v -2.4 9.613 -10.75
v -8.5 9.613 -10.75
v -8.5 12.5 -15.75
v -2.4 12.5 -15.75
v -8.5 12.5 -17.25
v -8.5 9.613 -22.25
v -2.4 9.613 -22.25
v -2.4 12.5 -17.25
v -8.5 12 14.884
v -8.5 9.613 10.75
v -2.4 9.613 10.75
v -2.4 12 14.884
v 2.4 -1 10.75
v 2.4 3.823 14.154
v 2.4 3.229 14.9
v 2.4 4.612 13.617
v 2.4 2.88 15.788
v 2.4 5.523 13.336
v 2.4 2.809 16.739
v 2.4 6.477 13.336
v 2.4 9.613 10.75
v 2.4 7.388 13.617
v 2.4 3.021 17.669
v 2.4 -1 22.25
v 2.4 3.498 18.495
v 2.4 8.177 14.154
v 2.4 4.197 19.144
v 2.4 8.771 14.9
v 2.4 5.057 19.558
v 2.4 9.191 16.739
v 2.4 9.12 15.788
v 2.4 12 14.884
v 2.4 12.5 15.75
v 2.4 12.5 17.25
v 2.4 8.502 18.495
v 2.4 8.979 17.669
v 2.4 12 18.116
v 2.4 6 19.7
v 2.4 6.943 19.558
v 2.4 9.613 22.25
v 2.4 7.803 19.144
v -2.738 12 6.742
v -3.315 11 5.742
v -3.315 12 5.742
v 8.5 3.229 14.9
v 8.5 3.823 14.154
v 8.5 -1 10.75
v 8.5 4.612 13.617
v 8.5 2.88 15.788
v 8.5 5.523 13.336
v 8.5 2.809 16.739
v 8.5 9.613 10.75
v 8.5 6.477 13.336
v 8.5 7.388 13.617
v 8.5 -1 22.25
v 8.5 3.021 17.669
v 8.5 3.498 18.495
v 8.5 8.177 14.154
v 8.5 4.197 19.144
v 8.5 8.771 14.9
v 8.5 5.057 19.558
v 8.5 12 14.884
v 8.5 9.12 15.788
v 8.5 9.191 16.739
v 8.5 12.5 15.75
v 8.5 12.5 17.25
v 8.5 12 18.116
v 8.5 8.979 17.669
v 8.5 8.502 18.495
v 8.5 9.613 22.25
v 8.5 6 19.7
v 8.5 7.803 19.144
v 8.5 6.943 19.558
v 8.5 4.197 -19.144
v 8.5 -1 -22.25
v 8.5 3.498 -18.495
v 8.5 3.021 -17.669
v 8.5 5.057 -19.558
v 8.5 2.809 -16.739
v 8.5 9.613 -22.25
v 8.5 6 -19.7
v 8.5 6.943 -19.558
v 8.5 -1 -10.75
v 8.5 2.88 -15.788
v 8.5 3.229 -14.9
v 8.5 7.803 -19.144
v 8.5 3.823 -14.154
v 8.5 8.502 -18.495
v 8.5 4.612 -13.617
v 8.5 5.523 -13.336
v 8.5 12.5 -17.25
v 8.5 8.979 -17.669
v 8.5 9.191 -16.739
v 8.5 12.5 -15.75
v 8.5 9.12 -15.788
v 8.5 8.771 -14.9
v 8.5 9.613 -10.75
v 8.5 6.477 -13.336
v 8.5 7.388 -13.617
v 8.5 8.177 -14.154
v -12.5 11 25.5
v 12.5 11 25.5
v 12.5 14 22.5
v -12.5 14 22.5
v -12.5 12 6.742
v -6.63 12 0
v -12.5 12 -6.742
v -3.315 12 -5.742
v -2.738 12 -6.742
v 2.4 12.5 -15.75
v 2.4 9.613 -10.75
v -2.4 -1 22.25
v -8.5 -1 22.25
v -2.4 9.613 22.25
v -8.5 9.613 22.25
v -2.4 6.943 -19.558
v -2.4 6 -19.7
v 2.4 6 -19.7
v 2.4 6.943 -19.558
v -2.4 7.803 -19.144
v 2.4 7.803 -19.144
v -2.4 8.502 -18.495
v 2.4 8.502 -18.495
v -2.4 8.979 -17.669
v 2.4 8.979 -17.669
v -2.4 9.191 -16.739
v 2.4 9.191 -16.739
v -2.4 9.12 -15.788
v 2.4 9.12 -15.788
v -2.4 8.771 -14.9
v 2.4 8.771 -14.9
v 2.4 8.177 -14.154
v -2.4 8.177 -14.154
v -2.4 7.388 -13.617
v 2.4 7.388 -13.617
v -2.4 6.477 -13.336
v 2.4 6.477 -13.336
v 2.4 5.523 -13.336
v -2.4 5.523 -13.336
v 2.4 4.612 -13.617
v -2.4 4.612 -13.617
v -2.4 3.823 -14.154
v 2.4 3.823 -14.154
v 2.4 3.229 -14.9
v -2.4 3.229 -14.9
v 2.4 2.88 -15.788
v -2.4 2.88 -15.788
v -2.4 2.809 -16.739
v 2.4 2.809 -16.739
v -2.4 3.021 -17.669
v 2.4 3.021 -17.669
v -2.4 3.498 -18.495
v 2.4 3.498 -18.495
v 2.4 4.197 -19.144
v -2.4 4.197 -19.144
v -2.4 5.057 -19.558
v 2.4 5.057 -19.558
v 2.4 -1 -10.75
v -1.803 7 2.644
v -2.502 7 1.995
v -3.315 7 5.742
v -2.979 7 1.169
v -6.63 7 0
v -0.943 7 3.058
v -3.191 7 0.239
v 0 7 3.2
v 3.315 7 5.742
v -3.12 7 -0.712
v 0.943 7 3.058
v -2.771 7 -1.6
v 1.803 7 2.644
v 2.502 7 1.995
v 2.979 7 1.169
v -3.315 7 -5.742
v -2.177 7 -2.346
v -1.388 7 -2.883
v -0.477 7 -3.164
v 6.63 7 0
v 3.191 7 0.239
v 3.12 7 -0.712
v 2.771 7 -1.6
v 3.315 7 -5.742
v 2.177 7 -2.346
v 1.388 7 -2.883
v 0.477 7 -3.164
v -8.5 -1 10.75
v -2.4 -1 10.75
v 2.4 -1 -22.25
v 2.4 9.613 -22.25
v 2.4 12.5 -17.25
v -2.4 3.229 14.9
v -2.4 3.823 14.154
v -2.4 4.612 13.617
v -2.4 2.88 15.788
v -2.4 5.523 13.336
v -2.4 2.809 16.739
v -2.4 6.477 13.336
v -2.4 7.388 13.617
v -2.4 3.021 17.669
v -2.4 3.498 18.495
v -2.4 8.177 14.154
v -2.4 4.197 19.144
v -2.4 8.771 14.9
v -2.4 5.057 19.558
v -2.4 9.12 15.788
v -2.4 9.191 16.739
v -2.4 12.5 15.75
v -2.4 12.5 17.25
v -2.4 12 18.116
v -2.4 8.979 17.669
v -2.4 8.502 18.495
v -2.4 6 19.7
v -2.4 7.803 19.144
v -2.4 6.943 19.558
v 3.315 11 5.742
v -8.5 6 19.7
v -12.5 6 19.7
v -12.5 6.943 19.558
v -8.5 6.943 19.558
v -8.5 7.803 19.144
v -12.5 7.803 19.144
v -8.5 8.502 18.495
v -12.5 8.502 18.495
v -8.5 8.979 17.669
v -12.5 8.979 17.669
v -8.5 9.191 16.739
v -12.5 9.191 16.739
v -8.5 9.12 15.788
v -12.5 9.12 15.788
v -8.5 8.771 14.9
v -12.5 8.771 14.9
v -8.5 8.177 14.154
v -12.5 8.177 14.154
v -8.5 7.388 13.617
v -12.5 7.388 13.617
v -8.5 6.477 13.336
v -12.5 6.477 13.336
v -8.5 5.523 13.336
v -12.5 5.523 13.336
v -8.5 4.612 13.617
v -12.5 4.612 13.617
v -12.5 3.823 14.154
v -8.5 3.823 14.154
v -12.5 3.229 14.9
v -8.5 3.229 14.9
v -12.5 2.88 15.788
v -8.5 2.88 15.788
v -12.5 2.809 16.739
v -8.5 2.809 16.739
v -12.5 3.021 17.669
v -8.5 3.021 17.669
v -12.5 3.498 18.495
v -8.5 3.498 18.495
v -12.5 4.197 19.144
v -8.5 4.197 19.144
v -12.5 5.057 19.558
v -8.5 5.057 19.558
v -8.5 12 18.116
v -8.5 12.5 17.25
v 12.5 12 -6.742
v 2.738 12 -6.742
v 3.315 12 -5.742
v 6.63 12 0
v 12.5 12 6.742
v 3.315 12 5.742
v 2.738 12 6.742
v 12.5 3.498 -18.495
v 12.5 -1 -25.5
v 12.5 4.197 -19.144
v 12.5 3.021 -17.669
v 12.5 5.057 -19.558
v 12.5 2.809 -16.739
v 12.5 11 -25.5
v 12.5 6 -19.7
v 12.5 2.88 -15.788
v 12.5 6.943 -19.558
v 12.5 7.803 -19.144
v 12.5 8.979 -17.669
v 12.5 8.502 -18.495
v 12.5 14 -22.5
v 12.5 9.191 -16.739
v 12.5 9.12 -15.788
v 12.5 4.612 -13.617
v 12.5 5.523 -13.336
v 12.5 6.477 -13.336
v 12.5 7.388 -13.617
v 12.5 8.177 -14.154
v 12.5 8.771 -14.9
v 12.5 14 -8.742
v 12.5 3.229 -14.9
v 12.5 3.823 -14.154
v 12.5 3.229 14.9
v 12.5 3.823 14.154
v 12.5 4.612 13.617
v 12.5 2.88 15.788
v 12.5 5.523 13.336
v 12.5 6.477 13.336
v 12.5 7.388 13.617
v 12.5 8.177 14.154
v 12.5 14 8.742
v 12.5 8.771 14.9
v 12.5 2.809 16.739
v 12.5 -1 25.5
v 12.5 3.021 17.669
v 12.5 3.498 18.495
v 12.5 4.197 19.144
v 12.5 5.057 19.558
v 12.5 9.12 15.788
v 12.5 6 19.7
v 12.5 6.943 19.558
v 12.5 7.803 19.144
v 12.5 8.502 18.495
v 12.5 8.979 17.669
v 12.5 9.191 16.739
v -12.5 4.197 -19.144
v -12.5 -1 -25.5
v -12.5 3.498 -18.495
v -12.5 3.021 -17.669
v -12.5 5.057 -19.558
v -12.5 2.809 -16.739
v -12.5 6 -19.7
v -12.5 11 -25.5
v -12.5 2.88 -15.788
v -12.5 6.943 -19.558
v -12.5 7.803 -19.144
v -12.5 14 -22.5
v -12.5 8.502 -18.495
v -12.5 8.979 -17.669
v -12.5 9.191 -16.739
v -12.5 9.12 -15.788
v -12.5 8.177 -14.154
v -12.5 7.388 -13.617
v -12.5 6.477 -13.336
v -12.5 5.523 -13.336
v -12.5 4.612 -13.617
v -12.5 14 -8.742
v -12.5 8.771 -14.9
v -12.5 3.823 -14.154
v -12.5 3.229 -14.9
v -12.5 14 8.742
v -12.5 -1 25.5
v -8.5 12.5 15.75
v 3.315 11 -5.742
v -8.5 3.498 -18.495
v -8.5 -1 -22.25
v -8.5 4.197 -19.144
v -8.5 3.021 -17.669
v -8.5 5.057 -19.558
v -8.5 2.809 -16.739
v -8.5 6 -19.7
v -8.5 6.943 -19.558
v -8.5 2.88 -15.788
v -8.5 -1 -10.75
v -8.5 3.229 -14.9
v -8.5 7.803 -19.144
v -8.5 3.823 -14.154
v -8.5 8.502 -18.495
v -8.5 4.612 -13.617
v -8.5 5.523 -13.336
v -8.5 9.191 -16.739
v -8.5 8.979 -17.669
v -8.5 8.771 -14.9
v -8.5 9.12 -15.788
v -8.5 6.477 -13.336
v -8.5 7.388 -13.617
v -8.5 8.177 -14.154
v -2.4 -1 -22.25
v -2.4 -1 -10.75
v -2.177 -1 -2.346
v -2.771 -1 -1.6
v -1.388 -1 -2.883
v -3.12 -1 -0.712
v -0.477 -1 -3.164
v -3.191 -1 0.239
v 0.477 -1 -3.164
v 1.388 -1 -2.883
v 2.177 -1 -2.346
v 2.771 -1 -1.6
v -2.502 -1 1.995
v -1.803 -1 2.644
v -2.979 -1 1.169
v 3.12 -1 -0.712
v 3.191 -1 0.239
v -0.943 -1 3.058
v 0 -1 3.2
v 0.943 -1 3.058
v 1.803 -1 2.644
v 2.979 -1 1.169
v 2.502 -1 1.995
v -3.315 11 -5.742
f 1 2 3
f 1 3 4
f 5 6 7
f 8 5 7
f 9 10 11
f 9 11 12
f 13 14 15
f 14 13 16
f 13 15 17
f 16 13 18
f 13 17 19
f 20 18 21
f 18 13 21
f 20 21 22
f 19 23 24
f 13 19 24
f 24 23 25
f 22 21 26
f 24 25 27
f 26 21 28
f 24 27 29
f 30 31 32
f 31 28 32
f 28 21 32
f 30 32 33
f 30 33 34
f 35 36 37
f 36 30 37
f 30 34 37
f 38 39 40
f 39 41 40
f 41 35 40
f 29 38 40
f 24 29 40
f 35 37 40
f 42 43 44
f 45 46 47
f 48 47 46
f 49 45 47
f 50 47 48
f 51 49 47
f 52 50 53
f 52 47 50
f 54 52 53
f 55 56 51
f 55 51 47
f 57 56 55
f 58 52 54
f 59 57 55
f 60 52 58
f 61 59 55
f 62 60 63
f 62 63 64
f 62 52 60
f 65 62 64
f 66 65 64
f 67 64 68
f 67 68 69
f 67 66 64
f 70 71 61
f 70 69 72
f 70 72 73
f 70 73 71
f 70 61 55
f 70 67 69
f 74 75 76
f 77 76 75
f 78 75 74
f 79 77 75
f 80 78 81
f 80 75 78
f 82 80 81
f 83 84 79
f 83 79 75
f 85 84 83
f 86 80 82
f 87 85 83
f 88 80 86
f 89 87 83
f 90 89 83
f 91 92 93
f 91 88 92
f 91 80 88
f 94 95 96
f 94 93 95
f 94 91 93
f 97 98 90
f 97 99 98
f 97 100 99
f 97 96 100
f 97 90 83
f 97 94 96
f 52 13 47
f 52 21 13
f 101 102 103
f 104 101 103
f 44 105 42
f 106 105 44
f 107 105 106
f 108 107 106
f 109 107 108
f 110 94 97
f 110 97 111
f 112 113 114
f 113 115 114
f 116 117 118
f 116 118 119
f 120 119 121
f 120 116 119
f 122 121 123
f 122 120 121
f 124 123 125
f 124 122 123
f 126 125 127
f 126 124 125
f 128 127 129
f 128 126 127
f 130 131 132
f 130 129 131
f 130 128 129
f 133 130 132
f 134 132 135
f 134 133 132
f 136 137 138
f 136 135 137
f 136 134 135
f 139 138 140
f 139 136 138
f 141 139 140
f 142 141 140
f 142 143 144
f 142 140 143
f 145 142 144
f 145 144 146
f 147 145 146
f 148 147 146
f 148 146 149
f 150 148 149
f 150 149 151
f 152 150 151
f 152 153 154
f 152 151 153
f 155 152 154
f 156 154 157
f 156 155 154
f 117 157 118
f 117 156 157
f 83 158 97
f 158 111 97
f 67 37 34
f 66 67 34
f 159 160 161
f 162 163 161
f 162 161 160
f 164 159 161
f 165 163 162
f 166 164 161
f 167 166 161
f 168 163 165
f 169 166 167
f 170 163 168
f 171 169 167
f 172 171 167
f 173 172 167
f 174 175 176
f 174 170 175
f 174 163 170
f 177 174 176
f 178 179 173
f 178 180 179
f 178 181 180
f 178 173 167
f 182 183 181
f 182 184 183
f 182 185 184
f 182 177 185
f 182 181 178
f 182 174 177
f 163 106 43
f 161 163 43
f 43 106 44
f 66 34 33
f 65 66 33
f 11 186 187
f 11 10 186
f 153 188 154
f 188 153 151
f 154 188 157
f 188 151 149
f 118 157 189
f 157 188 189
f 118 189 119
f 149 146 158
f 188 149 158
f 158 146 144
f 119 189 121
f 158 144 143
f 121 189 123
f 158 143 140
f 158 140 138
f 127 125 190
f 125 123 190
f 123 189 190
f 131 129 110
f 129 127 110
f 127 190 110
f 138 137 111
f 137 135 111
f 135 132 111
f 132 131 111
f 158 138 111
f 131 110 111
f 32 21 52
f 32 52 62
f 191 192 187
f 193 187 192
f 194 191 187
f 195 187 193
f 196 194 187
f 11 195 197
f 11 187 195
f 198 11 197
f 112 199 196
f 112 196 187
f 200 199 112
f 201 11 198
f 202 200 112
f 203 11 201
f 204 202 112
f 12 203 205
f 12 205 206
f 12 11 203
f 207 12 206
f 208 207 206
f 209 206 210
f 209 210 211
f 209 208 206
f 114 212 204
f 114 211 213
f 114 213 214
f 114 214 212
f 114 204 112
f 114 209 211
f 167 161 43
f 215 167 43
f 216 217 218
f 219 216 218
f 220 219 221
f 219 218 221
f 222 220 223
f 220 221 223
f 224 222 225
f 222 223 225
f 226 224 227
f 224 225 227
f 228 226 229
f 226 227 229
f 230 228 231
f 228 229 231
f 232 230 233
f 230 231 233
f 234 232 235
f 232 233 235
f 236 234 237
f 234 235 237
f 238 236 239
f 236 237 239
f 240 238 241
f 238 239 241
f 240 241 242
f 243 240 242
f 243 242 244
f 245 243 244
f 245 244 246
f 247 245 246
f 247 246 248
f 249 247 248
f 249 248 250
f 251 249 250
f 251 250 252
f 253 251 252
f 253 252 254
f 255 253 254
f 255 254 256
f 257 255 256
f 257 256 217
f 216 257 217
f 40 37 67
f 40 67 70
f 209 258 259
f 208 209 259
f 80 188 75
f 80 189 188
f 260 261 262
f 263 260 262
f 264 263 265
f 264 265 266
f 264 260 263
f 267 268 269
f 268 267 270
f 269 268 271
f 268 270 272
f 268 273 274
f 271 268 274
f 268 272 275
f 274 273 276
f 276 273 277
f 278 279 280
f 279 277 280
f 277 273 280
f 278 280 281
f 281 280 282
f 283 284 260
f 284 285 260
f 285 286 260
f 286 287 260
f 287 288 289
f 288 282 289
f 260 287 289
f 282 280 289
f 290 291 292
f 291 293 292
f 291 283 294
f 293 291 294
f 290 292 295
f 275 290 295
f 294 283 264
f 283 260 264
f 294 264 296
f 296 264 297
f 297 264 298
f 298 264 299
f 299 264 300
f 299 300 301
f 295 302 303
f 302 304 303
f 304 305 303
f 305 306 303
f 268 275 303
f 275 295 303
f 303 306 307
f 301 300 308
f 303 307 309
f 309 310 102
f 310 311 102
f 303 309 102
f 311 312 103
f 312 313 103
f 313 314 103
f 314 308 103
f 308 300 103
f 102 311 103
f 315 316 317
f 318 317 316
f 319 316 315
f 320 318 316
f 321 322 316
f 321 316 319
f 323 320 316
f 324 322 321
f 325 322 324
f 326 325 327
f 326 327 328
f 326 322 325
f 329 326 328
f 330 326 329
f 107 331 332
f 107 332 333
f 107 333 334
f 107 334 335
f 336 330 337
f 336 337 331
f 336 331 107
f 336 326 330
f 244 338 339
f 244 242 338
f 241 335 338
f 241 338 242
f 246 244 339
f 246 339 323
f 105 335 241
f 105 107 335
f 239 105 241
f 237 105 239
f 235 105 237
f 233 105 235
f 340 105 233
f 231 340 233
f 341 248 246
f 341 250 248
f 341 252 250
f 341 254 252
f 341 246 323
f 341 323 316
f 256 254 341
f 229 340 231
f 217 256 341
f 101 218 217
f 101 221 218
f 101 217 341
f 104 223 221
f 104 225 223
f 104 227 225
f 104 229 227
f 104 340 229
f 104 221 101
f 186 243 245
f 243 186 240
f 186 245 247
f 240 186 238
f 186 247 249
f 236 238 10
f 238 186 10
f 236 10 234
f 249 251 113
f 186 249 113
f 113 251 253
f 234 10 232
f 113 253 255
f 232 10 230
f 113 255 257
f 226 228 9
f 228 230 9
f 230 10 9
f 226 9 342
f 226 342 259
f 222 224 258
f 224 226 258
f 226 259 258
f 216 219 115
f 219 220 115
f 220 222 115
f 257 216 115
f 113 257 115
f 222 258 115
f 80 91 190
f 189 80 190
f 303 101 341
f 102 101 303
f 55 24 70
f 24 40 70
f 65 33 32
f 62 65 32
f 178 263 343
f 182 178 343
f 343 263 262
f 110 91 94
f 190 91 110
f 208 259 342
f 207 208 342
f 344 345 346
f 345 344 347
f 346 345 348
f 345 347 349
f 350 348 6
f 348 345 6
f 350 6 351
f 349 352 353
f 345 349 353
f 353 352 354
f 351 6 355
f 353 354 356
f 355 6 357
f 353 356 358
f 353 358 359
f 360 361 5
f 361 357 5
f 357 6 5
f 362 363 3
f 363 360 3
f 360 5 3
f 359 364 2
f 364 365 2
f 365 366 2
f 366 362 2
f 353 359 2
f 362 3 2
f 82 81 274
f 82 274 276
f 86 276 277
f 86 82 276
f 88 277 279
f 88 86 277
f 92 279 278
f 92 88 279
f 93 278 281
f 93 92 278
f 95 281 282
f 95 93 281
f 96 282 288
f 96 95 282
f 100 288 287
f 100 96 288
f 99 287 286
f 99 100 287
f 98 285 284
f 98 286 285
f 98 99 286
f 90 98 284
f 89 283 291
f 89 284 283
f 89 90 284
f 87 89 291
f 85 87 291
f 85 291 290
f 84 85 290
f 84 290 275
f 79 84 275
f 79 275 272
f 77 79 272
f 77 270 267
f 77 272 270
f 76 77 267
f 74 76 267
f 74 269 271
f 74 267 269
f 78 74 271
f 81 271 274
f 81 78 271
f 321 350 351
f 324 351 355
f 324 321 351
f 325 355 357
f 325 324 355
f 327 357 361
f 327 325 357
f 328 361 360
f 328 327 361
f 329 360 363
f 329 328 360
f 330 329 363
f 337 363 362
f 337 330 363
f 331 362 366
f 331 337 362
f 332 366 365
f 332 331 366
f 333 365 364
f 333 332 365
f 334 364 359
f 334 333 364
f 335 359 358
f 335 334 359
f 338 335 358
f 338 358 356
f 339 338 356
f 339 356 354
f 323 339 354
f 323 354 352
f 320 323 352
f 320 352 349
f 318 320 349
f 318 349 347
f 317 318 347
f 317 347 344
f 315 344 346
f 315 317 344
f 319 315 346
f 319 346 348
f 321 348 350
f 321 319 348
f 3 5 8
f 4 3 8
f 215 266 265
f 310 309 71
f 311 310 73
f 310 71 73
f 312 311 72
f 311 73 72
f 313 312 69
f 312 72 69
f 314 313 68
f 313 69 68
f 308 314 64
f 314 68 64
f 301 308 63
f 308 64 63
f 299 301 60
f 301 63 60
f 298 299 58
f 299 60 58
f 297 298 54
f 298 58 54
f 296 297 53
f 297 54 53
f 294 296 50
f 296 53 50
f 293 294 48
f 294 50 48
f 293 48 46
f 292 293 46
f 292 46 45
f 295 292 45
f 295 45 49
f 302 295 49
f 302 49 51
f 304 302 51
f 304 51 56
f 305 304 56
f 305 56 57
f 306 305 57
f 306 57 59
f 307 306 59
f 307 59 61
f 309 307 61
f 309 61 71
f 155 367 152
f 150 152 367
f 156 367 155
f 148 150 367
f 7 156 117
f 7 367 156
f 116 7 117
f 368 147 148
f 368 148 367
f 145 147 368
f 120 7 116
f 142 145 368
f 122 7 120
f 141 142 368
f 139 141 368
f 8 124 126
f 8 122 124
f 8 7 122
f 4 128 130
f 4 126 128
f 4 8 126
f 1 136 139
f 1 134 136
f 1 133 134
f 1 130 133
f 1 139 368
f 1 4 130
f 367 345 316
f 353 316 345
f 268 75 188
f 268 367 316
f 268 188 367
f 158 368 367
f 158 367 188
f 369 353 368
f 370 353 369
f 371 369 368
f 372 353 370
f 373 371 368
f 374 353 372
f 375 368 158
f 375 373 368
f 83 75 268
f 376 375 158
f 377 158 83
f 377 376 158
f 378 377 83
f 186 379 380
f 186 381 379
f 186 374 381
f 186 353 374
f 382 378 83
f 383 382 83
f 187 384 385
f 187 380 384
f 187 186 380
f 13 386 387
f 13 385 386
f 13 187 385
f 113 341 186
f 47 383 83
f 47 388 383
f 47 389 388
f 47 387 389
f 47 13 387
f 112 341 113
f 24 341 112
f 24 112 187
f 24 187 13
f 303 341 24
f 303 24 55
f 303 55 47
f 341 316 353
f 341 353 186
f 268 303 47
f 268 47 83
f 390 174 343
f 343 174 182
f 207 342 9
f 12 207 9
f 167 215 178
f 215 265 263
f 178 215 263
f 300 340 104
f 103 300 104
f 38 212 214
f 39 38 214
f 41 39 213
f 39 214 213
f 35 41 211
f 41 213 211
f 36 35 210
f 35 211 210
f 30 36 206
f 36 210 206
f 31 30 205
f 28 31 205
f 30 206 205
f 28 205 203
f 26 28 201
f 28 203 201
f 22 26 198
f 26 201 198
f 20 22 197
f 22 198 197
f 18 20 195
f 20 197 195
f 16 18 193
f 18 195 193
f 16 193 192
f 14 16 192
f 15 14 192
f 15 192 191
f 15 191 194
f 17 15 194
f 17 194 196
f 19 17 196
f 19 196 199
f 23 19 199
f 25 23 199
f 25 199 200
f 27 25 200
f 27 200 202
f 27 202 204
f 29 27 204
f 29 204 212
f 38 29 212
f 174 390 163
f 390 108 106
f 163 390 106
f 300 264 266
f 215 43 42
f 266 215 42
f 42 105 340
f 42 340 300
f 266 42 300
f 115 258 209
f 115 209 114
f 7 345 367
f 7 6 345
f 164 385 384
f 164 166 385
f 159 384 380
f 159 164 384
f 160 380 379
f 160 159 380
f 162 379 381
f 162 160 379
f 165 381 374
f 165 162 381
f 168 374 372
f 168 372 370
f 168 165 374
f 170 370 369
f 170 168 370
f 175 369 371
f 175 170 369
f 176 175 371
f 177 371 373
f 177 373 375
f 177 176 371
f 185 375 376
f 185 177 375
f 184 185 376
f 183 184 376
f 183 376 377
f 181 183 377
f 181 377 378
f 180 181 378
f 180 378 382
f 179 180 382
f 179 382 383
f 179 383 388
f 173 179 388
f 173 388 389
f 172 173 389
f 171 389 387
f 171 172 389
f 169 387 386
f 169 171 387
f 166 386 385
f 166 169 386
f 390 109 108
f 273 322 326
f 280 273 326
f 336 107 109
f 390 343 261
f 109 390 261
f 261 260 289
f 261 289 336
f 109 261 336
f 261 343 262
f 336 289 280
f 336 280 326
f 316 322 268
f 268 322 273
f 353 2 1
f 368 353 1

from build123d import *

# Parameters (mm, degrees)
SKETCH1_W                    = 25
SKETCH1_H                    = 45
BOSS_EXTRUDE1_DEPTH          = 12
CUT_EXTRUDE1_DEPTH           = 5
SKETCH3_R                    = 3.2
CUT_EXTRUDE2_DEPTH           = 27.673957337
SKETCH8_R                    = 3.2
CUT_EXTRUDE5_DEPTH           = 36.710642671
SKETCH9_W                    = 25
SKETCH9_H                    = 16.758251573
BOSS_EXTRUDE2_DEPTH          = 2
SKETCH12_W                   = 6.1
SKETCH12_H                   = 11.5
CUT_EXTRUDE6_DEPTH           = 12.5
CHAMFER1_SIZE                = 5
CHAMFER1_SIZE2               = 2.886751346
SKETCH14_W                   = 25
SKETCH14_H                   = 14
BOSS_EXTRUDE3_DEPTH          = 3
CHAMFER1_OF_MIRROR2_SIZE2    = 5
CHAMFER1_OF_MIRROR2_SIZE     = 2.886751346
MIRROR3_START                = -8.5
MIRROR3_OUTLINE_R            = 3.2
MIRROR3_DEPTH                = 6.1
MIRROR3_START_2              = 2.4
MIRROR3_2_OUTLINE_R          = 3.2
MIRROR3_2_DEPTH              = 6.1
MIRROR3_START_3              = -12.5
MIRROR3_3_DEPTH              = 25
MIRROR3_START_4              = -2.4
MIRROR3_4_DEPTH              = 4.8
MIRROR3_5_DEPTH              = 4
MIRROR3_START_5              = 8.5
MIRROR3_6_DEPTH              = 4
CHAMFER2_SIZE                = 3
SKETCH17_W                   = 25
SKETCH17_H                   = 51
SKETCH17_R                   = 3.2
SKETCH17_W_2                 = 6.1
SKETCH17_H_2                 = 11.5
EXTRA_1MM_BASE_EXTRUDE_DEPTH = 1


# Read off the part's stored shape, not the designer's step: Mirror3
with BuildPart() as part:
    # Sketch1 → Boss-Extrude1 (new body)
    with BuildSketch(Plane(origin=(0, 0, 0), x_dir=(1, 0, 0), z_dir=(0, 1, 0))):
        Rectangle(SKETCH1_W, SKETCH1_H)
    extrude(amount=BOSS_EXTRUDE1_DEPTH)

    # Sketch2 → Cut-Extrude1 (cut)
    with BuildSketch(Plane(origin=(0, 12, 0), x_dir=(1, 0, 0), z_dir=(0, 1, 0))):
        Polygon((3.315, -5.741748427), (6.63, 0), (3.315, 5.741748427), (-3.315, 5.741748427), (-6.63, 0), (-3.315, -5.741748427), align=None)
    extrude(amount=-CUT_EXTRUDE1_DEPTH, mode=Mode.SUBTRACT)

    # Sketch3 → Cut-Extrude2 (cut, through all)
    with BuildSketch(Plane(origin=(0, 7, 0), x_dir=(1, 0, 0), z_dir=(0, 1, 0))):
        with Locations(Location((0, 0, 0), (0, 0, 270))):
            Circle(SKETCH3_R)
    extrude(amount=-CUT_EXTRUDE2_DEPTH, mode=Mode.SUBTRACT)

    # Sketch8 → Cut-Extrude5 (cut, through all)
    with BuildSketch(Plane.ZY.offset(12.5)):
        with Locations((16.5, 6)):
            Circle(SKETCH8_R)
    cut_extrude5 = extrude(amount=-CUT_EXTRUDE5_DEPTH, mode=Mode.SUBTRACT)

    # Mirror1: Cut-Extrude5 across plane
    add(cut_extrude5.mirror(Plane.XY), mode=Mode.SUBTRACT)

    # Sketch9 → Boss-Extrude2 (add)
    with BuildSketch(Plane(origin=(0, 12, 0), x_dir=(1, 0, 0), z_dir=(0, 1, 0))):
        with Locations((0, 14.120874214)):
            Rectangle(SKETCH9_W, SKETCH9_H)
    extrude(amount=BOSS_EXTRUDE2_DEPTH)

    # Sketch12 → Cut-Extrude6 (cut)
    with BuildSketch(Plane(origin=(0, 0, 0), x_dir=(1, 0, 0), z_dir=(0, 1, 0))):
        with Locations((-5.45, 16.5)):
            Rectangle(SKETCH12_W, SKETCH12_H)
    cut_extrude6 = extrude(amount=CUT_EXTRUDE6_DEPTH, mode=Mode.SUBTRACT)

    # Chamfer1
    chamfer1_edges = [part.edges().sort_by_distance(p)[0] for p in [
        (-5.45, 12.5, -10.75),
        (-5.45, 12.5, -22.25),
    ]]
    chamfer1_side = [part.faces().sort_by_distance(p)[0] for p in [
        (-5.45, 12.5, -16.5),
    ]]
    chamfer(chamfer1_edges, length=CHAMFER1_SIZE, length2=CHAMFER1_SIZE2, reference=chamfer1_side[0])

    # Sketch14 → Boss-Extrude3 (add)
    with BuildSketch(Plane(origin=(0, 0, -22.5), x_dir=(-1, 0, 0), z_dir=(0, 0, -1))):
        with Locations((0, 7)):
            Rectangle(SKETCH14_W, SKETCH14_H)
    extrude(amount=BOSS_EXTRUDE3_DEPTH)

    # Mirror2: Cut-Extrude6 across plane
    add(cut_extrude6.mirror(Plane(origin=(0, 0, 0), x_dir=(0, 0, 1), z_dir=(1, 0, 0))), mode=Mode.SUBTRACT)

    # Chamfer1 of Mirror2
    chamfer1_of_mirror2_edges = [part.edges().sort_by_distance(p)[0] for p in [
        (5.45, 12.5, -10.75),
        (5.45, 12.5, -22.25),
    ]]
    chamfer(chamfer1_of_mirror2_edges, length=CHAMFER1_OF_MIRROR2_SIZE, length2=CHAMFER1_OF_MIRROR2_SIZE2)

    # Mirror3 outline → Mirror3 (cut)
    with BuildSketch(Plane.YZ.offset(MIRROR3_START)):
        Polygon((9.613248654, 10.75), (12, 14.883974596), (12, 18.116025404), (9.613248654, 22.25), (0, 22.25), (0, 10.75), align=None)
        with Locations((6, 16.5)):
            Circle(MIRROR3_OUTLINE_R, mode=Mode.SUBTRACT)
    extrude(amount=MIRROR3_DEPTH, mode=Mode.SUBTRACT)

    # Mirror3 2 outline → Mirror3 2 (cut)
    with BuildSketch(Plane.YZ.offset(MIRROR3_START_2)):
        Polygon((9.613248654, 10.75), (12, 14.883974596), (12, 18.116025404), (9.613248654, 22.25), (0, 22.25), (0, 10.75), align=None)
        with Locations((6, 16.5)):
            Circle(MIRROR3_2_OUTLINE_R, mode=Mode.SUBTRACT)
    extrude(amount=MIRROR3_2_DEPTH, mode=Mode.SUBTRACT)

    # Mirror3 3 outline → Mirror3 3 (add)
    with BuildSketch(Plane.YZ.offset(MIRROR3_START_3)):
        Polygon((12, 5.741748427), (14, 5.741748427), (14, 25.5), (0, 25.5), (0, 22.5), (12, 22.5), (12, 18.116025404), (12.5, 17.25), (12.5, 15.75), (12, 14.883974596), align=None)
    extrude(amount=MIRROR3_3_DEPTH)

    # Mirror3 4 outline → Mirror3 4 (add)
    with BuildSketch(Plane.YZ.offset(MIRROR3_START_4)):
        Polygon((12, 18.116025404), (12, 14.883974596), (12.5, 15.75), (12.5, 17.25), align=None)
    extrude(amount=MIRROR3_4_DEPTH)

    # Mirror3 5 outline → Mirror3 5 (add)
    with BuildSketch(Plane.YZ.offset(MIRROR3_START_3)):
        Polygon((12, 18.116025404), (12, 14.883974596), (12.5, 15.75), (12.5, 17.25), align=None)
    extrude(amount=MIRROR3_5_DEPTH)

    # Mirror3 6 outline → Mirror3 6 (add)
    with BuildSketch(Plane.YZ.offset(MIRROR3_START_5)):
        Polygon((12, 18.116025404), (12, 14.883974596), (12.5, 15.75), (12.5, 17.25), align=None)
    extrude(amount=MIRROR3_6_DEPTH)

    # Chamfer2
    # the kernel refuses this chamfer: 3 mm, written as the material it takes off along each edge
    with BuildSketch(Plane(origin=(20.215048964, 14, -5.741748427), x_dir=(0, -0.9996219169112969, 0.027495876610586497), z_dir=(-1, 0, 0))) as chamfer2_piece_1_section:
        Polygon((CHAMFER2_SIZE * 0.999621916911, -CHAMFER2_SIZE * 0.0274958766106), (-CHAMFER2_SIZE * 0.0274958766106, -CHAMFER2_SIZE * 0.999621916911), (0, 0), align=None)
    chamfer2_piece_1 = extrude(amount=40.430097928, mode=Mode.PRIVATE)
    chamfer2_piece_1 = split(chamfer2_piece_1, bisect_by=Plane(origin=(11.444466888, 12, -6.852192504), z_dir=(0, 1, 0)), keep=Keep.TOP, mode=Mode.PRIVATE)
    chamfer2_piece_1 = split(chamfer2_piece_1, bisect_by=Plane(origin=(4.866530332, 13.212813285, -3.054419063), z_dir=(0.8660254037844385, 0, -0.5000000000000003)), keep=Keep.TOP, mode=Mode.PRIVATE)
    add(chamfer2_piece_1, mode=Mode.SUBTRACT)
    with BuildSketch(Plane(origin=(20.215048964, 14, -5.741748427), x_dir=(0, -0.9996219169112969, 0.027495876610586497), z_dir=(-1, 0, 0))) as chamfer2_piece_2_section:
        Polygon((CHAMFER2_SIZE * 0.999621916911, -CHAMFER2_SIZE * 0.0274958766106), (-CHAMFER2_SIZE * 0.0274958766106, -CHAMFER2_SIZE * 0.999621916911), (0, 0), align=None)
    chamfer2_piece_2 = extrude(amount=40.430097928, mode=Mode.PRIVATE)
    chamfer2_piece_2 = split(chamfer2_piece_2, bisect_by=Plane(origin=(0, 12, -5.991035204), z_dir=(0, -1, 0)), keep=Keep.TOP, mode=Mode.PRIVATE)
    chamfer2_piece_2 = split(chamfer2_piece_2, bisect_by=Plane(origin=(-2.378305659, 11.613346541, -7.364150617), z_dir=(0.8660254037844387, 0, 0.5000000000000001)), keep=Keep.TOP, mode=Mode.PRIVATE)
    chamfer2_piece_2 = split(chamfer2_piece_2, bisect_by=Plane(origin=(2.378305659, 11.613346541, -7.364150617), z_dir=(-0.8660254037844385, 0, 0.5000000000000003)), keep=Keep.TOP, mode=Mode.PRIVATE)
    add(chamfer2_piece_2, mode=Mode.SUBTRACT)
    with BuildSketch(Plane(origin=(20.215048964, 14, -5.741748427), x_dir=(0, -0.9996219169112969, 0.027495876610586497), z_dir=(-1, 0, 0))) as chamfer2_piece_3_section:
        Polygon((CHAMFER2_SIZE * 0.999621916911, -CHAMFER2_SIZE * 0.0274958766106), (-CHAMFER2_SIZE * 0.0274958766106, -CHAMFER2_SIZE * 0.999621916911), (0, 0), align=None)
    chamfer2_piece_3 = extrude(amount=40.430097928, mode=Mode.PRIVATE)
    chamfer2_piece_3 = split(chamfer2_piece_3, bisect_by=Plane(origin=(0, 12, -6.713987666), z_dir=(0, 1, 0)), keep=Keep.TOP, mode=Mode.PRIVATE)
    chamfer2_piece_3 = split(chamfer2_piece_3, bisect_by=Plane(origin=(-2.06525806, 13.168089522, -7.906364963), z_dir=(0.8660254037844387, 0, 0.5000000000000001)), keep=Keep.TOP, mode=Mode.PRIVATE)
    chamfer2_piece_3 = split(chamfer2_piece_3, bisect_by=Plane(origin=(2.06525806, 13.168089522, -7.906364963), z_dir=(-0.8660254037844385, 0, 0.5000000000000003)), keep=Keep.TOP, mode=Mode.PRIVATE)
    add(chamfer2_piece_3, mode=Mode.SUBTRACT)
    with BuildSketch(Plane(origin=(20.215048964, 14, -5.741748427), x_dir=(0, -0.9996219169112969, 0.027495876610586497), z_dir=(-1, 0, 0))) as chamfer2_piece_4_section:
        Polygon((CHAMFER2_SIZE * 0.999621916911, -CHAMFER2_SIZE * 0.0274958766106), (-CHAMFER2_SIZE * 0.0274958766106, -CHAMFER2_SIZE * 0.999621916911), (0, 0), align=None)
    chamfer2_piece_4 = extrude(amount=40.430097928, mode=Mode.PRIVATE)
    chamfer2_piece_4 = split(chamfer2_piece_4, bisect_by=Plane(origin=(-11.444466888, 12, -6.852192504), z_dir=(0, 1, 0)), keep=Keep.TOP, mode=Mode.PRIVATE)
    chamfer2_piece_4 = split(chamfer2_piece_4, bisect_by=Plane(origin=(-4.866530332, 13.212813285, -3.054419063), z_dir=(-0.8660254037844387, 0, -0.5000000000000001)), keep=Keep.TOP, mode=Mode.PRIVATE)
    add(chamfer2_piece_4, mode=Mode.SUBTRACT)
    with BuildSketch(Plane(origin=(-20.215048964, 14, 25.5), x_dir=(0, -0.9996219169112968, 0.02749587661058678), z_dir=(1, 0, 0)), Plane(origin=(20.215048964, 14, -25.5), x_dir=(0, -0.9996219169112968, -0.02749587661058678), z_dir=(-1, 0, 0))) as chamfer2_piece_5:
        Polygon((CHAMFER2_SIZE * 0.999621916911, CHAMFER2_SIZE * 0.0274958766106), (-CHAMFER2_SIZE * 0.0274958766106, CHAMFER2_SIZE * 0.999621916911), (0, 0), align=None)
    extrude(amount=40.430097928, mode=Mode.SUBTRACT)
    with BuildSketch(Plane(origin=(-20.215048964, 14, 5.741748427), x_dir=(0, -0.9996219169112969, -0.027495876610586497), z_dir=(1, 0, 0))) as chamfer2_piece_6_section:
        Polygon((CHAMFER2_SIZE * 0.999621916911, -CHAMFER2_SIZE * 0.0274958766106), (-CHAMFER2_SIZE * 0.0274958766106, -CHAMFER2_SIZE * 0.999621916911), (0, 0), align=None)
    chamfer2_piece_6 = extrude(amount=40.430097928, mode=Mode.PRIVATE)
    chamfer2_piece_6 = split(chamfer2_piece_6, bisect_by=Plane(origin=(-11.444466888, 12, 6.852192504), z_dir=(0, 1, 0)), keep=Keep.TOP, mode=Mode.PRIVATE)
    chamfer2_piece_6 = split(chamfer2_piece_6, bisect_by=Plane(origin=(-4.866530332, 13.212813285, 3.054419063), z_dir=(-0.8660254037844385, 0, 0.5000000000000004)), keep=Keep.TOP, mode=Mode.PRIVATE)
    add(chamfer2_piece_6, mode=Mode.SUBTRACT)
    with BuildSketch(Plane(origin=(-20.215048964, 14, 5.741748427), x_dir=(0, -0.9996219169112969, -0.027495876610586497), z_dir=(1, 0, 0))) as chamfer2_piece_7_section:
        Polygon((CHAMFER2_SIZE * 0.999621916911, -CHAMFER2_SIZE * 0.0274958766106), (-CHAMFER2_SIZE * 0.0274958766106, -CHAMFER2_SIZE * 0.999621916911), (0, 0), align=None)
    chamfer2_piece_7 = extrude(amount=40.430097928, mode=Mode.PRIVATE)
    chamfer2_piece_7 = split(chamfer2_piece_7, bisect_by=Plane(origin=(0, 12, 5.991035204), z_dir=(0, -1, 0)), keep=Keep.TOP, mode=Mode.PRIVATE)
    chamfer2_piece_7 = split(chamfer2_piece_7, bisect_by=Plane(origin=(-2.378305659, 11.613346541, 7.364150617), z_dir=(0.8660254037844385, 0, -0.5000000000000004)), keep=Keep.TOP, mode=Mode.PRIVATE)
    chamfer2_piece_7 = split(chamfer2_piece_7, bisect_by=Plane(origin=(2.378305659, 11.613346541, 7.364150617), z_dir=(-0.8660254037844385, 0, -0.5000000000000004)), keep=Keep.TOP, mode=Mode.PRIVATE)
    add(chamfer2_piece_7, mode=Mode.SUBTRACT)
    with BuildSketch(Plane(origin=(-20.215048964, 14, 5.741748427), x_dir=(0, -0.9996219169112969, -0.027495876610586497), z_dir=(1, 0, 0))) as chamfer2_piece_8_section:
        Polygon((CHAMFER2_SIZE * 0.999621916911, -CHAMFER2_SIZE * 0.0274958766106), (-CHAMFER2_SIZE * 0.0274958766106, -CHAMFER2_SIZE * 0.999621916911), (0, 0), align=None)
    chamfer2_piece_8 = extrude(amount=40.430097928, mode=Mode.PRIVATE)
    chamfer2_piece_8 = split(chamfer2_piece_8, bisect_by=Plane(origin=(0, 12, 6.713987666), z_dir=(0, 1, 0)), keep=Keep.TOP, mode=Mode.PRIVATE)
    chamfer2_piece_8 = split(chamfer2_piece_8, bisect_by=Plane(origin=(-2.06525806, 13.168089522, 7.906364963), z_dir=(0.8660254037844385, 0, -0.5000000000000004)), keep=Keep.TOP, mode=Mode.PRIVATE)
    chamfer2_piece_8 = split(chamfer2_piece_8, bisect_by=Plane(origin=(2.06525806, 13.168089522, 7.906364963), z_dir=(-0.8660254037844385, 0, -0.5000000000000004)), keep=Keep.TOP, mode=Mode.PRIVATE)
    add(chamfer2_piece_8, mode=Mode.SUBTRACT)
    with BuildSketch(Plane(origin=(-20.215048964, 14, 5.741748427), x_dir=(0, -0.9996219169112969, -0.027495876610586497), z_dir=(1, 0, 0))) as chamfer2_piece_9_section:
        Polygon((CHAMFER2_SIZE * 0.999621916911, -CHAMFER2_SIZE * 0.0274958766106), (-CHAMFER2_SIZE * 0.0274958766106, -CHAMFER2_SIZE * 0.999621916911), (0, 0), align=None)
    chamfer2_piece_9 = extrude(amount=40.430097928, mode=Mode.PRIVATE)
    chamfer2_piece_9 = split(chamfer2_piece_9, bisect_by=Plane(origin=(11.444466888, 12, 6.852192504), z_dir=(0, 1, 0)), keep=Keep.TOP, mode=Mode.PRIVATE)
    chamfer2_piece_9 = split(chamfer2_piece_9, bisect_by=Plane(origin=(4.866530332, 13.212813285, 3.054419063), z_dir=(0.8660254037844385, 0, 0.5000000000000004)), keep=Keep.TOP, mode=Mode.PRIVATE)
    add(chamfer2_piece_9, mode=Mode.SUBTRACT)

    # Sketch17 → Extra 1mm base extrude (add)
    with BuildSketch(Plane.XZ):
        Rectangle(SKETCH17_W, SKETCH17_H)
        with Locations(Location((0, 0, 0), (0, 0, 90))):
            Circle(SKETCH17_R, mode=Mode.SUBTRACT)
        with Locations((-5.45, 16.5)):
            Rectangle(SKETCH17_W_2, SKETCH17_H_2, mode=Mode.SUBTRACT)
        with Locations((5.45, 16.5)):
            Rectangle(SKETCH17_W_2, SKETCH17_H_2, mode=Mode.SUBTRACT)
        with Locations((5.45, -16.5)):
            Rectangle(SKETCH17_W_2, SKETCH17_H_2, mode=Mode.SUBTRACT)
        with Locations((-5.45, -16.5)):
            Rectangle(SKETCH17_W_2, SKETCH17_H_2, mode=Mode.SUBTRACT)
    extrude(amount=EXTRA_1MM_BASE_EXTRUDE_DEPTH)


solid = part.part
